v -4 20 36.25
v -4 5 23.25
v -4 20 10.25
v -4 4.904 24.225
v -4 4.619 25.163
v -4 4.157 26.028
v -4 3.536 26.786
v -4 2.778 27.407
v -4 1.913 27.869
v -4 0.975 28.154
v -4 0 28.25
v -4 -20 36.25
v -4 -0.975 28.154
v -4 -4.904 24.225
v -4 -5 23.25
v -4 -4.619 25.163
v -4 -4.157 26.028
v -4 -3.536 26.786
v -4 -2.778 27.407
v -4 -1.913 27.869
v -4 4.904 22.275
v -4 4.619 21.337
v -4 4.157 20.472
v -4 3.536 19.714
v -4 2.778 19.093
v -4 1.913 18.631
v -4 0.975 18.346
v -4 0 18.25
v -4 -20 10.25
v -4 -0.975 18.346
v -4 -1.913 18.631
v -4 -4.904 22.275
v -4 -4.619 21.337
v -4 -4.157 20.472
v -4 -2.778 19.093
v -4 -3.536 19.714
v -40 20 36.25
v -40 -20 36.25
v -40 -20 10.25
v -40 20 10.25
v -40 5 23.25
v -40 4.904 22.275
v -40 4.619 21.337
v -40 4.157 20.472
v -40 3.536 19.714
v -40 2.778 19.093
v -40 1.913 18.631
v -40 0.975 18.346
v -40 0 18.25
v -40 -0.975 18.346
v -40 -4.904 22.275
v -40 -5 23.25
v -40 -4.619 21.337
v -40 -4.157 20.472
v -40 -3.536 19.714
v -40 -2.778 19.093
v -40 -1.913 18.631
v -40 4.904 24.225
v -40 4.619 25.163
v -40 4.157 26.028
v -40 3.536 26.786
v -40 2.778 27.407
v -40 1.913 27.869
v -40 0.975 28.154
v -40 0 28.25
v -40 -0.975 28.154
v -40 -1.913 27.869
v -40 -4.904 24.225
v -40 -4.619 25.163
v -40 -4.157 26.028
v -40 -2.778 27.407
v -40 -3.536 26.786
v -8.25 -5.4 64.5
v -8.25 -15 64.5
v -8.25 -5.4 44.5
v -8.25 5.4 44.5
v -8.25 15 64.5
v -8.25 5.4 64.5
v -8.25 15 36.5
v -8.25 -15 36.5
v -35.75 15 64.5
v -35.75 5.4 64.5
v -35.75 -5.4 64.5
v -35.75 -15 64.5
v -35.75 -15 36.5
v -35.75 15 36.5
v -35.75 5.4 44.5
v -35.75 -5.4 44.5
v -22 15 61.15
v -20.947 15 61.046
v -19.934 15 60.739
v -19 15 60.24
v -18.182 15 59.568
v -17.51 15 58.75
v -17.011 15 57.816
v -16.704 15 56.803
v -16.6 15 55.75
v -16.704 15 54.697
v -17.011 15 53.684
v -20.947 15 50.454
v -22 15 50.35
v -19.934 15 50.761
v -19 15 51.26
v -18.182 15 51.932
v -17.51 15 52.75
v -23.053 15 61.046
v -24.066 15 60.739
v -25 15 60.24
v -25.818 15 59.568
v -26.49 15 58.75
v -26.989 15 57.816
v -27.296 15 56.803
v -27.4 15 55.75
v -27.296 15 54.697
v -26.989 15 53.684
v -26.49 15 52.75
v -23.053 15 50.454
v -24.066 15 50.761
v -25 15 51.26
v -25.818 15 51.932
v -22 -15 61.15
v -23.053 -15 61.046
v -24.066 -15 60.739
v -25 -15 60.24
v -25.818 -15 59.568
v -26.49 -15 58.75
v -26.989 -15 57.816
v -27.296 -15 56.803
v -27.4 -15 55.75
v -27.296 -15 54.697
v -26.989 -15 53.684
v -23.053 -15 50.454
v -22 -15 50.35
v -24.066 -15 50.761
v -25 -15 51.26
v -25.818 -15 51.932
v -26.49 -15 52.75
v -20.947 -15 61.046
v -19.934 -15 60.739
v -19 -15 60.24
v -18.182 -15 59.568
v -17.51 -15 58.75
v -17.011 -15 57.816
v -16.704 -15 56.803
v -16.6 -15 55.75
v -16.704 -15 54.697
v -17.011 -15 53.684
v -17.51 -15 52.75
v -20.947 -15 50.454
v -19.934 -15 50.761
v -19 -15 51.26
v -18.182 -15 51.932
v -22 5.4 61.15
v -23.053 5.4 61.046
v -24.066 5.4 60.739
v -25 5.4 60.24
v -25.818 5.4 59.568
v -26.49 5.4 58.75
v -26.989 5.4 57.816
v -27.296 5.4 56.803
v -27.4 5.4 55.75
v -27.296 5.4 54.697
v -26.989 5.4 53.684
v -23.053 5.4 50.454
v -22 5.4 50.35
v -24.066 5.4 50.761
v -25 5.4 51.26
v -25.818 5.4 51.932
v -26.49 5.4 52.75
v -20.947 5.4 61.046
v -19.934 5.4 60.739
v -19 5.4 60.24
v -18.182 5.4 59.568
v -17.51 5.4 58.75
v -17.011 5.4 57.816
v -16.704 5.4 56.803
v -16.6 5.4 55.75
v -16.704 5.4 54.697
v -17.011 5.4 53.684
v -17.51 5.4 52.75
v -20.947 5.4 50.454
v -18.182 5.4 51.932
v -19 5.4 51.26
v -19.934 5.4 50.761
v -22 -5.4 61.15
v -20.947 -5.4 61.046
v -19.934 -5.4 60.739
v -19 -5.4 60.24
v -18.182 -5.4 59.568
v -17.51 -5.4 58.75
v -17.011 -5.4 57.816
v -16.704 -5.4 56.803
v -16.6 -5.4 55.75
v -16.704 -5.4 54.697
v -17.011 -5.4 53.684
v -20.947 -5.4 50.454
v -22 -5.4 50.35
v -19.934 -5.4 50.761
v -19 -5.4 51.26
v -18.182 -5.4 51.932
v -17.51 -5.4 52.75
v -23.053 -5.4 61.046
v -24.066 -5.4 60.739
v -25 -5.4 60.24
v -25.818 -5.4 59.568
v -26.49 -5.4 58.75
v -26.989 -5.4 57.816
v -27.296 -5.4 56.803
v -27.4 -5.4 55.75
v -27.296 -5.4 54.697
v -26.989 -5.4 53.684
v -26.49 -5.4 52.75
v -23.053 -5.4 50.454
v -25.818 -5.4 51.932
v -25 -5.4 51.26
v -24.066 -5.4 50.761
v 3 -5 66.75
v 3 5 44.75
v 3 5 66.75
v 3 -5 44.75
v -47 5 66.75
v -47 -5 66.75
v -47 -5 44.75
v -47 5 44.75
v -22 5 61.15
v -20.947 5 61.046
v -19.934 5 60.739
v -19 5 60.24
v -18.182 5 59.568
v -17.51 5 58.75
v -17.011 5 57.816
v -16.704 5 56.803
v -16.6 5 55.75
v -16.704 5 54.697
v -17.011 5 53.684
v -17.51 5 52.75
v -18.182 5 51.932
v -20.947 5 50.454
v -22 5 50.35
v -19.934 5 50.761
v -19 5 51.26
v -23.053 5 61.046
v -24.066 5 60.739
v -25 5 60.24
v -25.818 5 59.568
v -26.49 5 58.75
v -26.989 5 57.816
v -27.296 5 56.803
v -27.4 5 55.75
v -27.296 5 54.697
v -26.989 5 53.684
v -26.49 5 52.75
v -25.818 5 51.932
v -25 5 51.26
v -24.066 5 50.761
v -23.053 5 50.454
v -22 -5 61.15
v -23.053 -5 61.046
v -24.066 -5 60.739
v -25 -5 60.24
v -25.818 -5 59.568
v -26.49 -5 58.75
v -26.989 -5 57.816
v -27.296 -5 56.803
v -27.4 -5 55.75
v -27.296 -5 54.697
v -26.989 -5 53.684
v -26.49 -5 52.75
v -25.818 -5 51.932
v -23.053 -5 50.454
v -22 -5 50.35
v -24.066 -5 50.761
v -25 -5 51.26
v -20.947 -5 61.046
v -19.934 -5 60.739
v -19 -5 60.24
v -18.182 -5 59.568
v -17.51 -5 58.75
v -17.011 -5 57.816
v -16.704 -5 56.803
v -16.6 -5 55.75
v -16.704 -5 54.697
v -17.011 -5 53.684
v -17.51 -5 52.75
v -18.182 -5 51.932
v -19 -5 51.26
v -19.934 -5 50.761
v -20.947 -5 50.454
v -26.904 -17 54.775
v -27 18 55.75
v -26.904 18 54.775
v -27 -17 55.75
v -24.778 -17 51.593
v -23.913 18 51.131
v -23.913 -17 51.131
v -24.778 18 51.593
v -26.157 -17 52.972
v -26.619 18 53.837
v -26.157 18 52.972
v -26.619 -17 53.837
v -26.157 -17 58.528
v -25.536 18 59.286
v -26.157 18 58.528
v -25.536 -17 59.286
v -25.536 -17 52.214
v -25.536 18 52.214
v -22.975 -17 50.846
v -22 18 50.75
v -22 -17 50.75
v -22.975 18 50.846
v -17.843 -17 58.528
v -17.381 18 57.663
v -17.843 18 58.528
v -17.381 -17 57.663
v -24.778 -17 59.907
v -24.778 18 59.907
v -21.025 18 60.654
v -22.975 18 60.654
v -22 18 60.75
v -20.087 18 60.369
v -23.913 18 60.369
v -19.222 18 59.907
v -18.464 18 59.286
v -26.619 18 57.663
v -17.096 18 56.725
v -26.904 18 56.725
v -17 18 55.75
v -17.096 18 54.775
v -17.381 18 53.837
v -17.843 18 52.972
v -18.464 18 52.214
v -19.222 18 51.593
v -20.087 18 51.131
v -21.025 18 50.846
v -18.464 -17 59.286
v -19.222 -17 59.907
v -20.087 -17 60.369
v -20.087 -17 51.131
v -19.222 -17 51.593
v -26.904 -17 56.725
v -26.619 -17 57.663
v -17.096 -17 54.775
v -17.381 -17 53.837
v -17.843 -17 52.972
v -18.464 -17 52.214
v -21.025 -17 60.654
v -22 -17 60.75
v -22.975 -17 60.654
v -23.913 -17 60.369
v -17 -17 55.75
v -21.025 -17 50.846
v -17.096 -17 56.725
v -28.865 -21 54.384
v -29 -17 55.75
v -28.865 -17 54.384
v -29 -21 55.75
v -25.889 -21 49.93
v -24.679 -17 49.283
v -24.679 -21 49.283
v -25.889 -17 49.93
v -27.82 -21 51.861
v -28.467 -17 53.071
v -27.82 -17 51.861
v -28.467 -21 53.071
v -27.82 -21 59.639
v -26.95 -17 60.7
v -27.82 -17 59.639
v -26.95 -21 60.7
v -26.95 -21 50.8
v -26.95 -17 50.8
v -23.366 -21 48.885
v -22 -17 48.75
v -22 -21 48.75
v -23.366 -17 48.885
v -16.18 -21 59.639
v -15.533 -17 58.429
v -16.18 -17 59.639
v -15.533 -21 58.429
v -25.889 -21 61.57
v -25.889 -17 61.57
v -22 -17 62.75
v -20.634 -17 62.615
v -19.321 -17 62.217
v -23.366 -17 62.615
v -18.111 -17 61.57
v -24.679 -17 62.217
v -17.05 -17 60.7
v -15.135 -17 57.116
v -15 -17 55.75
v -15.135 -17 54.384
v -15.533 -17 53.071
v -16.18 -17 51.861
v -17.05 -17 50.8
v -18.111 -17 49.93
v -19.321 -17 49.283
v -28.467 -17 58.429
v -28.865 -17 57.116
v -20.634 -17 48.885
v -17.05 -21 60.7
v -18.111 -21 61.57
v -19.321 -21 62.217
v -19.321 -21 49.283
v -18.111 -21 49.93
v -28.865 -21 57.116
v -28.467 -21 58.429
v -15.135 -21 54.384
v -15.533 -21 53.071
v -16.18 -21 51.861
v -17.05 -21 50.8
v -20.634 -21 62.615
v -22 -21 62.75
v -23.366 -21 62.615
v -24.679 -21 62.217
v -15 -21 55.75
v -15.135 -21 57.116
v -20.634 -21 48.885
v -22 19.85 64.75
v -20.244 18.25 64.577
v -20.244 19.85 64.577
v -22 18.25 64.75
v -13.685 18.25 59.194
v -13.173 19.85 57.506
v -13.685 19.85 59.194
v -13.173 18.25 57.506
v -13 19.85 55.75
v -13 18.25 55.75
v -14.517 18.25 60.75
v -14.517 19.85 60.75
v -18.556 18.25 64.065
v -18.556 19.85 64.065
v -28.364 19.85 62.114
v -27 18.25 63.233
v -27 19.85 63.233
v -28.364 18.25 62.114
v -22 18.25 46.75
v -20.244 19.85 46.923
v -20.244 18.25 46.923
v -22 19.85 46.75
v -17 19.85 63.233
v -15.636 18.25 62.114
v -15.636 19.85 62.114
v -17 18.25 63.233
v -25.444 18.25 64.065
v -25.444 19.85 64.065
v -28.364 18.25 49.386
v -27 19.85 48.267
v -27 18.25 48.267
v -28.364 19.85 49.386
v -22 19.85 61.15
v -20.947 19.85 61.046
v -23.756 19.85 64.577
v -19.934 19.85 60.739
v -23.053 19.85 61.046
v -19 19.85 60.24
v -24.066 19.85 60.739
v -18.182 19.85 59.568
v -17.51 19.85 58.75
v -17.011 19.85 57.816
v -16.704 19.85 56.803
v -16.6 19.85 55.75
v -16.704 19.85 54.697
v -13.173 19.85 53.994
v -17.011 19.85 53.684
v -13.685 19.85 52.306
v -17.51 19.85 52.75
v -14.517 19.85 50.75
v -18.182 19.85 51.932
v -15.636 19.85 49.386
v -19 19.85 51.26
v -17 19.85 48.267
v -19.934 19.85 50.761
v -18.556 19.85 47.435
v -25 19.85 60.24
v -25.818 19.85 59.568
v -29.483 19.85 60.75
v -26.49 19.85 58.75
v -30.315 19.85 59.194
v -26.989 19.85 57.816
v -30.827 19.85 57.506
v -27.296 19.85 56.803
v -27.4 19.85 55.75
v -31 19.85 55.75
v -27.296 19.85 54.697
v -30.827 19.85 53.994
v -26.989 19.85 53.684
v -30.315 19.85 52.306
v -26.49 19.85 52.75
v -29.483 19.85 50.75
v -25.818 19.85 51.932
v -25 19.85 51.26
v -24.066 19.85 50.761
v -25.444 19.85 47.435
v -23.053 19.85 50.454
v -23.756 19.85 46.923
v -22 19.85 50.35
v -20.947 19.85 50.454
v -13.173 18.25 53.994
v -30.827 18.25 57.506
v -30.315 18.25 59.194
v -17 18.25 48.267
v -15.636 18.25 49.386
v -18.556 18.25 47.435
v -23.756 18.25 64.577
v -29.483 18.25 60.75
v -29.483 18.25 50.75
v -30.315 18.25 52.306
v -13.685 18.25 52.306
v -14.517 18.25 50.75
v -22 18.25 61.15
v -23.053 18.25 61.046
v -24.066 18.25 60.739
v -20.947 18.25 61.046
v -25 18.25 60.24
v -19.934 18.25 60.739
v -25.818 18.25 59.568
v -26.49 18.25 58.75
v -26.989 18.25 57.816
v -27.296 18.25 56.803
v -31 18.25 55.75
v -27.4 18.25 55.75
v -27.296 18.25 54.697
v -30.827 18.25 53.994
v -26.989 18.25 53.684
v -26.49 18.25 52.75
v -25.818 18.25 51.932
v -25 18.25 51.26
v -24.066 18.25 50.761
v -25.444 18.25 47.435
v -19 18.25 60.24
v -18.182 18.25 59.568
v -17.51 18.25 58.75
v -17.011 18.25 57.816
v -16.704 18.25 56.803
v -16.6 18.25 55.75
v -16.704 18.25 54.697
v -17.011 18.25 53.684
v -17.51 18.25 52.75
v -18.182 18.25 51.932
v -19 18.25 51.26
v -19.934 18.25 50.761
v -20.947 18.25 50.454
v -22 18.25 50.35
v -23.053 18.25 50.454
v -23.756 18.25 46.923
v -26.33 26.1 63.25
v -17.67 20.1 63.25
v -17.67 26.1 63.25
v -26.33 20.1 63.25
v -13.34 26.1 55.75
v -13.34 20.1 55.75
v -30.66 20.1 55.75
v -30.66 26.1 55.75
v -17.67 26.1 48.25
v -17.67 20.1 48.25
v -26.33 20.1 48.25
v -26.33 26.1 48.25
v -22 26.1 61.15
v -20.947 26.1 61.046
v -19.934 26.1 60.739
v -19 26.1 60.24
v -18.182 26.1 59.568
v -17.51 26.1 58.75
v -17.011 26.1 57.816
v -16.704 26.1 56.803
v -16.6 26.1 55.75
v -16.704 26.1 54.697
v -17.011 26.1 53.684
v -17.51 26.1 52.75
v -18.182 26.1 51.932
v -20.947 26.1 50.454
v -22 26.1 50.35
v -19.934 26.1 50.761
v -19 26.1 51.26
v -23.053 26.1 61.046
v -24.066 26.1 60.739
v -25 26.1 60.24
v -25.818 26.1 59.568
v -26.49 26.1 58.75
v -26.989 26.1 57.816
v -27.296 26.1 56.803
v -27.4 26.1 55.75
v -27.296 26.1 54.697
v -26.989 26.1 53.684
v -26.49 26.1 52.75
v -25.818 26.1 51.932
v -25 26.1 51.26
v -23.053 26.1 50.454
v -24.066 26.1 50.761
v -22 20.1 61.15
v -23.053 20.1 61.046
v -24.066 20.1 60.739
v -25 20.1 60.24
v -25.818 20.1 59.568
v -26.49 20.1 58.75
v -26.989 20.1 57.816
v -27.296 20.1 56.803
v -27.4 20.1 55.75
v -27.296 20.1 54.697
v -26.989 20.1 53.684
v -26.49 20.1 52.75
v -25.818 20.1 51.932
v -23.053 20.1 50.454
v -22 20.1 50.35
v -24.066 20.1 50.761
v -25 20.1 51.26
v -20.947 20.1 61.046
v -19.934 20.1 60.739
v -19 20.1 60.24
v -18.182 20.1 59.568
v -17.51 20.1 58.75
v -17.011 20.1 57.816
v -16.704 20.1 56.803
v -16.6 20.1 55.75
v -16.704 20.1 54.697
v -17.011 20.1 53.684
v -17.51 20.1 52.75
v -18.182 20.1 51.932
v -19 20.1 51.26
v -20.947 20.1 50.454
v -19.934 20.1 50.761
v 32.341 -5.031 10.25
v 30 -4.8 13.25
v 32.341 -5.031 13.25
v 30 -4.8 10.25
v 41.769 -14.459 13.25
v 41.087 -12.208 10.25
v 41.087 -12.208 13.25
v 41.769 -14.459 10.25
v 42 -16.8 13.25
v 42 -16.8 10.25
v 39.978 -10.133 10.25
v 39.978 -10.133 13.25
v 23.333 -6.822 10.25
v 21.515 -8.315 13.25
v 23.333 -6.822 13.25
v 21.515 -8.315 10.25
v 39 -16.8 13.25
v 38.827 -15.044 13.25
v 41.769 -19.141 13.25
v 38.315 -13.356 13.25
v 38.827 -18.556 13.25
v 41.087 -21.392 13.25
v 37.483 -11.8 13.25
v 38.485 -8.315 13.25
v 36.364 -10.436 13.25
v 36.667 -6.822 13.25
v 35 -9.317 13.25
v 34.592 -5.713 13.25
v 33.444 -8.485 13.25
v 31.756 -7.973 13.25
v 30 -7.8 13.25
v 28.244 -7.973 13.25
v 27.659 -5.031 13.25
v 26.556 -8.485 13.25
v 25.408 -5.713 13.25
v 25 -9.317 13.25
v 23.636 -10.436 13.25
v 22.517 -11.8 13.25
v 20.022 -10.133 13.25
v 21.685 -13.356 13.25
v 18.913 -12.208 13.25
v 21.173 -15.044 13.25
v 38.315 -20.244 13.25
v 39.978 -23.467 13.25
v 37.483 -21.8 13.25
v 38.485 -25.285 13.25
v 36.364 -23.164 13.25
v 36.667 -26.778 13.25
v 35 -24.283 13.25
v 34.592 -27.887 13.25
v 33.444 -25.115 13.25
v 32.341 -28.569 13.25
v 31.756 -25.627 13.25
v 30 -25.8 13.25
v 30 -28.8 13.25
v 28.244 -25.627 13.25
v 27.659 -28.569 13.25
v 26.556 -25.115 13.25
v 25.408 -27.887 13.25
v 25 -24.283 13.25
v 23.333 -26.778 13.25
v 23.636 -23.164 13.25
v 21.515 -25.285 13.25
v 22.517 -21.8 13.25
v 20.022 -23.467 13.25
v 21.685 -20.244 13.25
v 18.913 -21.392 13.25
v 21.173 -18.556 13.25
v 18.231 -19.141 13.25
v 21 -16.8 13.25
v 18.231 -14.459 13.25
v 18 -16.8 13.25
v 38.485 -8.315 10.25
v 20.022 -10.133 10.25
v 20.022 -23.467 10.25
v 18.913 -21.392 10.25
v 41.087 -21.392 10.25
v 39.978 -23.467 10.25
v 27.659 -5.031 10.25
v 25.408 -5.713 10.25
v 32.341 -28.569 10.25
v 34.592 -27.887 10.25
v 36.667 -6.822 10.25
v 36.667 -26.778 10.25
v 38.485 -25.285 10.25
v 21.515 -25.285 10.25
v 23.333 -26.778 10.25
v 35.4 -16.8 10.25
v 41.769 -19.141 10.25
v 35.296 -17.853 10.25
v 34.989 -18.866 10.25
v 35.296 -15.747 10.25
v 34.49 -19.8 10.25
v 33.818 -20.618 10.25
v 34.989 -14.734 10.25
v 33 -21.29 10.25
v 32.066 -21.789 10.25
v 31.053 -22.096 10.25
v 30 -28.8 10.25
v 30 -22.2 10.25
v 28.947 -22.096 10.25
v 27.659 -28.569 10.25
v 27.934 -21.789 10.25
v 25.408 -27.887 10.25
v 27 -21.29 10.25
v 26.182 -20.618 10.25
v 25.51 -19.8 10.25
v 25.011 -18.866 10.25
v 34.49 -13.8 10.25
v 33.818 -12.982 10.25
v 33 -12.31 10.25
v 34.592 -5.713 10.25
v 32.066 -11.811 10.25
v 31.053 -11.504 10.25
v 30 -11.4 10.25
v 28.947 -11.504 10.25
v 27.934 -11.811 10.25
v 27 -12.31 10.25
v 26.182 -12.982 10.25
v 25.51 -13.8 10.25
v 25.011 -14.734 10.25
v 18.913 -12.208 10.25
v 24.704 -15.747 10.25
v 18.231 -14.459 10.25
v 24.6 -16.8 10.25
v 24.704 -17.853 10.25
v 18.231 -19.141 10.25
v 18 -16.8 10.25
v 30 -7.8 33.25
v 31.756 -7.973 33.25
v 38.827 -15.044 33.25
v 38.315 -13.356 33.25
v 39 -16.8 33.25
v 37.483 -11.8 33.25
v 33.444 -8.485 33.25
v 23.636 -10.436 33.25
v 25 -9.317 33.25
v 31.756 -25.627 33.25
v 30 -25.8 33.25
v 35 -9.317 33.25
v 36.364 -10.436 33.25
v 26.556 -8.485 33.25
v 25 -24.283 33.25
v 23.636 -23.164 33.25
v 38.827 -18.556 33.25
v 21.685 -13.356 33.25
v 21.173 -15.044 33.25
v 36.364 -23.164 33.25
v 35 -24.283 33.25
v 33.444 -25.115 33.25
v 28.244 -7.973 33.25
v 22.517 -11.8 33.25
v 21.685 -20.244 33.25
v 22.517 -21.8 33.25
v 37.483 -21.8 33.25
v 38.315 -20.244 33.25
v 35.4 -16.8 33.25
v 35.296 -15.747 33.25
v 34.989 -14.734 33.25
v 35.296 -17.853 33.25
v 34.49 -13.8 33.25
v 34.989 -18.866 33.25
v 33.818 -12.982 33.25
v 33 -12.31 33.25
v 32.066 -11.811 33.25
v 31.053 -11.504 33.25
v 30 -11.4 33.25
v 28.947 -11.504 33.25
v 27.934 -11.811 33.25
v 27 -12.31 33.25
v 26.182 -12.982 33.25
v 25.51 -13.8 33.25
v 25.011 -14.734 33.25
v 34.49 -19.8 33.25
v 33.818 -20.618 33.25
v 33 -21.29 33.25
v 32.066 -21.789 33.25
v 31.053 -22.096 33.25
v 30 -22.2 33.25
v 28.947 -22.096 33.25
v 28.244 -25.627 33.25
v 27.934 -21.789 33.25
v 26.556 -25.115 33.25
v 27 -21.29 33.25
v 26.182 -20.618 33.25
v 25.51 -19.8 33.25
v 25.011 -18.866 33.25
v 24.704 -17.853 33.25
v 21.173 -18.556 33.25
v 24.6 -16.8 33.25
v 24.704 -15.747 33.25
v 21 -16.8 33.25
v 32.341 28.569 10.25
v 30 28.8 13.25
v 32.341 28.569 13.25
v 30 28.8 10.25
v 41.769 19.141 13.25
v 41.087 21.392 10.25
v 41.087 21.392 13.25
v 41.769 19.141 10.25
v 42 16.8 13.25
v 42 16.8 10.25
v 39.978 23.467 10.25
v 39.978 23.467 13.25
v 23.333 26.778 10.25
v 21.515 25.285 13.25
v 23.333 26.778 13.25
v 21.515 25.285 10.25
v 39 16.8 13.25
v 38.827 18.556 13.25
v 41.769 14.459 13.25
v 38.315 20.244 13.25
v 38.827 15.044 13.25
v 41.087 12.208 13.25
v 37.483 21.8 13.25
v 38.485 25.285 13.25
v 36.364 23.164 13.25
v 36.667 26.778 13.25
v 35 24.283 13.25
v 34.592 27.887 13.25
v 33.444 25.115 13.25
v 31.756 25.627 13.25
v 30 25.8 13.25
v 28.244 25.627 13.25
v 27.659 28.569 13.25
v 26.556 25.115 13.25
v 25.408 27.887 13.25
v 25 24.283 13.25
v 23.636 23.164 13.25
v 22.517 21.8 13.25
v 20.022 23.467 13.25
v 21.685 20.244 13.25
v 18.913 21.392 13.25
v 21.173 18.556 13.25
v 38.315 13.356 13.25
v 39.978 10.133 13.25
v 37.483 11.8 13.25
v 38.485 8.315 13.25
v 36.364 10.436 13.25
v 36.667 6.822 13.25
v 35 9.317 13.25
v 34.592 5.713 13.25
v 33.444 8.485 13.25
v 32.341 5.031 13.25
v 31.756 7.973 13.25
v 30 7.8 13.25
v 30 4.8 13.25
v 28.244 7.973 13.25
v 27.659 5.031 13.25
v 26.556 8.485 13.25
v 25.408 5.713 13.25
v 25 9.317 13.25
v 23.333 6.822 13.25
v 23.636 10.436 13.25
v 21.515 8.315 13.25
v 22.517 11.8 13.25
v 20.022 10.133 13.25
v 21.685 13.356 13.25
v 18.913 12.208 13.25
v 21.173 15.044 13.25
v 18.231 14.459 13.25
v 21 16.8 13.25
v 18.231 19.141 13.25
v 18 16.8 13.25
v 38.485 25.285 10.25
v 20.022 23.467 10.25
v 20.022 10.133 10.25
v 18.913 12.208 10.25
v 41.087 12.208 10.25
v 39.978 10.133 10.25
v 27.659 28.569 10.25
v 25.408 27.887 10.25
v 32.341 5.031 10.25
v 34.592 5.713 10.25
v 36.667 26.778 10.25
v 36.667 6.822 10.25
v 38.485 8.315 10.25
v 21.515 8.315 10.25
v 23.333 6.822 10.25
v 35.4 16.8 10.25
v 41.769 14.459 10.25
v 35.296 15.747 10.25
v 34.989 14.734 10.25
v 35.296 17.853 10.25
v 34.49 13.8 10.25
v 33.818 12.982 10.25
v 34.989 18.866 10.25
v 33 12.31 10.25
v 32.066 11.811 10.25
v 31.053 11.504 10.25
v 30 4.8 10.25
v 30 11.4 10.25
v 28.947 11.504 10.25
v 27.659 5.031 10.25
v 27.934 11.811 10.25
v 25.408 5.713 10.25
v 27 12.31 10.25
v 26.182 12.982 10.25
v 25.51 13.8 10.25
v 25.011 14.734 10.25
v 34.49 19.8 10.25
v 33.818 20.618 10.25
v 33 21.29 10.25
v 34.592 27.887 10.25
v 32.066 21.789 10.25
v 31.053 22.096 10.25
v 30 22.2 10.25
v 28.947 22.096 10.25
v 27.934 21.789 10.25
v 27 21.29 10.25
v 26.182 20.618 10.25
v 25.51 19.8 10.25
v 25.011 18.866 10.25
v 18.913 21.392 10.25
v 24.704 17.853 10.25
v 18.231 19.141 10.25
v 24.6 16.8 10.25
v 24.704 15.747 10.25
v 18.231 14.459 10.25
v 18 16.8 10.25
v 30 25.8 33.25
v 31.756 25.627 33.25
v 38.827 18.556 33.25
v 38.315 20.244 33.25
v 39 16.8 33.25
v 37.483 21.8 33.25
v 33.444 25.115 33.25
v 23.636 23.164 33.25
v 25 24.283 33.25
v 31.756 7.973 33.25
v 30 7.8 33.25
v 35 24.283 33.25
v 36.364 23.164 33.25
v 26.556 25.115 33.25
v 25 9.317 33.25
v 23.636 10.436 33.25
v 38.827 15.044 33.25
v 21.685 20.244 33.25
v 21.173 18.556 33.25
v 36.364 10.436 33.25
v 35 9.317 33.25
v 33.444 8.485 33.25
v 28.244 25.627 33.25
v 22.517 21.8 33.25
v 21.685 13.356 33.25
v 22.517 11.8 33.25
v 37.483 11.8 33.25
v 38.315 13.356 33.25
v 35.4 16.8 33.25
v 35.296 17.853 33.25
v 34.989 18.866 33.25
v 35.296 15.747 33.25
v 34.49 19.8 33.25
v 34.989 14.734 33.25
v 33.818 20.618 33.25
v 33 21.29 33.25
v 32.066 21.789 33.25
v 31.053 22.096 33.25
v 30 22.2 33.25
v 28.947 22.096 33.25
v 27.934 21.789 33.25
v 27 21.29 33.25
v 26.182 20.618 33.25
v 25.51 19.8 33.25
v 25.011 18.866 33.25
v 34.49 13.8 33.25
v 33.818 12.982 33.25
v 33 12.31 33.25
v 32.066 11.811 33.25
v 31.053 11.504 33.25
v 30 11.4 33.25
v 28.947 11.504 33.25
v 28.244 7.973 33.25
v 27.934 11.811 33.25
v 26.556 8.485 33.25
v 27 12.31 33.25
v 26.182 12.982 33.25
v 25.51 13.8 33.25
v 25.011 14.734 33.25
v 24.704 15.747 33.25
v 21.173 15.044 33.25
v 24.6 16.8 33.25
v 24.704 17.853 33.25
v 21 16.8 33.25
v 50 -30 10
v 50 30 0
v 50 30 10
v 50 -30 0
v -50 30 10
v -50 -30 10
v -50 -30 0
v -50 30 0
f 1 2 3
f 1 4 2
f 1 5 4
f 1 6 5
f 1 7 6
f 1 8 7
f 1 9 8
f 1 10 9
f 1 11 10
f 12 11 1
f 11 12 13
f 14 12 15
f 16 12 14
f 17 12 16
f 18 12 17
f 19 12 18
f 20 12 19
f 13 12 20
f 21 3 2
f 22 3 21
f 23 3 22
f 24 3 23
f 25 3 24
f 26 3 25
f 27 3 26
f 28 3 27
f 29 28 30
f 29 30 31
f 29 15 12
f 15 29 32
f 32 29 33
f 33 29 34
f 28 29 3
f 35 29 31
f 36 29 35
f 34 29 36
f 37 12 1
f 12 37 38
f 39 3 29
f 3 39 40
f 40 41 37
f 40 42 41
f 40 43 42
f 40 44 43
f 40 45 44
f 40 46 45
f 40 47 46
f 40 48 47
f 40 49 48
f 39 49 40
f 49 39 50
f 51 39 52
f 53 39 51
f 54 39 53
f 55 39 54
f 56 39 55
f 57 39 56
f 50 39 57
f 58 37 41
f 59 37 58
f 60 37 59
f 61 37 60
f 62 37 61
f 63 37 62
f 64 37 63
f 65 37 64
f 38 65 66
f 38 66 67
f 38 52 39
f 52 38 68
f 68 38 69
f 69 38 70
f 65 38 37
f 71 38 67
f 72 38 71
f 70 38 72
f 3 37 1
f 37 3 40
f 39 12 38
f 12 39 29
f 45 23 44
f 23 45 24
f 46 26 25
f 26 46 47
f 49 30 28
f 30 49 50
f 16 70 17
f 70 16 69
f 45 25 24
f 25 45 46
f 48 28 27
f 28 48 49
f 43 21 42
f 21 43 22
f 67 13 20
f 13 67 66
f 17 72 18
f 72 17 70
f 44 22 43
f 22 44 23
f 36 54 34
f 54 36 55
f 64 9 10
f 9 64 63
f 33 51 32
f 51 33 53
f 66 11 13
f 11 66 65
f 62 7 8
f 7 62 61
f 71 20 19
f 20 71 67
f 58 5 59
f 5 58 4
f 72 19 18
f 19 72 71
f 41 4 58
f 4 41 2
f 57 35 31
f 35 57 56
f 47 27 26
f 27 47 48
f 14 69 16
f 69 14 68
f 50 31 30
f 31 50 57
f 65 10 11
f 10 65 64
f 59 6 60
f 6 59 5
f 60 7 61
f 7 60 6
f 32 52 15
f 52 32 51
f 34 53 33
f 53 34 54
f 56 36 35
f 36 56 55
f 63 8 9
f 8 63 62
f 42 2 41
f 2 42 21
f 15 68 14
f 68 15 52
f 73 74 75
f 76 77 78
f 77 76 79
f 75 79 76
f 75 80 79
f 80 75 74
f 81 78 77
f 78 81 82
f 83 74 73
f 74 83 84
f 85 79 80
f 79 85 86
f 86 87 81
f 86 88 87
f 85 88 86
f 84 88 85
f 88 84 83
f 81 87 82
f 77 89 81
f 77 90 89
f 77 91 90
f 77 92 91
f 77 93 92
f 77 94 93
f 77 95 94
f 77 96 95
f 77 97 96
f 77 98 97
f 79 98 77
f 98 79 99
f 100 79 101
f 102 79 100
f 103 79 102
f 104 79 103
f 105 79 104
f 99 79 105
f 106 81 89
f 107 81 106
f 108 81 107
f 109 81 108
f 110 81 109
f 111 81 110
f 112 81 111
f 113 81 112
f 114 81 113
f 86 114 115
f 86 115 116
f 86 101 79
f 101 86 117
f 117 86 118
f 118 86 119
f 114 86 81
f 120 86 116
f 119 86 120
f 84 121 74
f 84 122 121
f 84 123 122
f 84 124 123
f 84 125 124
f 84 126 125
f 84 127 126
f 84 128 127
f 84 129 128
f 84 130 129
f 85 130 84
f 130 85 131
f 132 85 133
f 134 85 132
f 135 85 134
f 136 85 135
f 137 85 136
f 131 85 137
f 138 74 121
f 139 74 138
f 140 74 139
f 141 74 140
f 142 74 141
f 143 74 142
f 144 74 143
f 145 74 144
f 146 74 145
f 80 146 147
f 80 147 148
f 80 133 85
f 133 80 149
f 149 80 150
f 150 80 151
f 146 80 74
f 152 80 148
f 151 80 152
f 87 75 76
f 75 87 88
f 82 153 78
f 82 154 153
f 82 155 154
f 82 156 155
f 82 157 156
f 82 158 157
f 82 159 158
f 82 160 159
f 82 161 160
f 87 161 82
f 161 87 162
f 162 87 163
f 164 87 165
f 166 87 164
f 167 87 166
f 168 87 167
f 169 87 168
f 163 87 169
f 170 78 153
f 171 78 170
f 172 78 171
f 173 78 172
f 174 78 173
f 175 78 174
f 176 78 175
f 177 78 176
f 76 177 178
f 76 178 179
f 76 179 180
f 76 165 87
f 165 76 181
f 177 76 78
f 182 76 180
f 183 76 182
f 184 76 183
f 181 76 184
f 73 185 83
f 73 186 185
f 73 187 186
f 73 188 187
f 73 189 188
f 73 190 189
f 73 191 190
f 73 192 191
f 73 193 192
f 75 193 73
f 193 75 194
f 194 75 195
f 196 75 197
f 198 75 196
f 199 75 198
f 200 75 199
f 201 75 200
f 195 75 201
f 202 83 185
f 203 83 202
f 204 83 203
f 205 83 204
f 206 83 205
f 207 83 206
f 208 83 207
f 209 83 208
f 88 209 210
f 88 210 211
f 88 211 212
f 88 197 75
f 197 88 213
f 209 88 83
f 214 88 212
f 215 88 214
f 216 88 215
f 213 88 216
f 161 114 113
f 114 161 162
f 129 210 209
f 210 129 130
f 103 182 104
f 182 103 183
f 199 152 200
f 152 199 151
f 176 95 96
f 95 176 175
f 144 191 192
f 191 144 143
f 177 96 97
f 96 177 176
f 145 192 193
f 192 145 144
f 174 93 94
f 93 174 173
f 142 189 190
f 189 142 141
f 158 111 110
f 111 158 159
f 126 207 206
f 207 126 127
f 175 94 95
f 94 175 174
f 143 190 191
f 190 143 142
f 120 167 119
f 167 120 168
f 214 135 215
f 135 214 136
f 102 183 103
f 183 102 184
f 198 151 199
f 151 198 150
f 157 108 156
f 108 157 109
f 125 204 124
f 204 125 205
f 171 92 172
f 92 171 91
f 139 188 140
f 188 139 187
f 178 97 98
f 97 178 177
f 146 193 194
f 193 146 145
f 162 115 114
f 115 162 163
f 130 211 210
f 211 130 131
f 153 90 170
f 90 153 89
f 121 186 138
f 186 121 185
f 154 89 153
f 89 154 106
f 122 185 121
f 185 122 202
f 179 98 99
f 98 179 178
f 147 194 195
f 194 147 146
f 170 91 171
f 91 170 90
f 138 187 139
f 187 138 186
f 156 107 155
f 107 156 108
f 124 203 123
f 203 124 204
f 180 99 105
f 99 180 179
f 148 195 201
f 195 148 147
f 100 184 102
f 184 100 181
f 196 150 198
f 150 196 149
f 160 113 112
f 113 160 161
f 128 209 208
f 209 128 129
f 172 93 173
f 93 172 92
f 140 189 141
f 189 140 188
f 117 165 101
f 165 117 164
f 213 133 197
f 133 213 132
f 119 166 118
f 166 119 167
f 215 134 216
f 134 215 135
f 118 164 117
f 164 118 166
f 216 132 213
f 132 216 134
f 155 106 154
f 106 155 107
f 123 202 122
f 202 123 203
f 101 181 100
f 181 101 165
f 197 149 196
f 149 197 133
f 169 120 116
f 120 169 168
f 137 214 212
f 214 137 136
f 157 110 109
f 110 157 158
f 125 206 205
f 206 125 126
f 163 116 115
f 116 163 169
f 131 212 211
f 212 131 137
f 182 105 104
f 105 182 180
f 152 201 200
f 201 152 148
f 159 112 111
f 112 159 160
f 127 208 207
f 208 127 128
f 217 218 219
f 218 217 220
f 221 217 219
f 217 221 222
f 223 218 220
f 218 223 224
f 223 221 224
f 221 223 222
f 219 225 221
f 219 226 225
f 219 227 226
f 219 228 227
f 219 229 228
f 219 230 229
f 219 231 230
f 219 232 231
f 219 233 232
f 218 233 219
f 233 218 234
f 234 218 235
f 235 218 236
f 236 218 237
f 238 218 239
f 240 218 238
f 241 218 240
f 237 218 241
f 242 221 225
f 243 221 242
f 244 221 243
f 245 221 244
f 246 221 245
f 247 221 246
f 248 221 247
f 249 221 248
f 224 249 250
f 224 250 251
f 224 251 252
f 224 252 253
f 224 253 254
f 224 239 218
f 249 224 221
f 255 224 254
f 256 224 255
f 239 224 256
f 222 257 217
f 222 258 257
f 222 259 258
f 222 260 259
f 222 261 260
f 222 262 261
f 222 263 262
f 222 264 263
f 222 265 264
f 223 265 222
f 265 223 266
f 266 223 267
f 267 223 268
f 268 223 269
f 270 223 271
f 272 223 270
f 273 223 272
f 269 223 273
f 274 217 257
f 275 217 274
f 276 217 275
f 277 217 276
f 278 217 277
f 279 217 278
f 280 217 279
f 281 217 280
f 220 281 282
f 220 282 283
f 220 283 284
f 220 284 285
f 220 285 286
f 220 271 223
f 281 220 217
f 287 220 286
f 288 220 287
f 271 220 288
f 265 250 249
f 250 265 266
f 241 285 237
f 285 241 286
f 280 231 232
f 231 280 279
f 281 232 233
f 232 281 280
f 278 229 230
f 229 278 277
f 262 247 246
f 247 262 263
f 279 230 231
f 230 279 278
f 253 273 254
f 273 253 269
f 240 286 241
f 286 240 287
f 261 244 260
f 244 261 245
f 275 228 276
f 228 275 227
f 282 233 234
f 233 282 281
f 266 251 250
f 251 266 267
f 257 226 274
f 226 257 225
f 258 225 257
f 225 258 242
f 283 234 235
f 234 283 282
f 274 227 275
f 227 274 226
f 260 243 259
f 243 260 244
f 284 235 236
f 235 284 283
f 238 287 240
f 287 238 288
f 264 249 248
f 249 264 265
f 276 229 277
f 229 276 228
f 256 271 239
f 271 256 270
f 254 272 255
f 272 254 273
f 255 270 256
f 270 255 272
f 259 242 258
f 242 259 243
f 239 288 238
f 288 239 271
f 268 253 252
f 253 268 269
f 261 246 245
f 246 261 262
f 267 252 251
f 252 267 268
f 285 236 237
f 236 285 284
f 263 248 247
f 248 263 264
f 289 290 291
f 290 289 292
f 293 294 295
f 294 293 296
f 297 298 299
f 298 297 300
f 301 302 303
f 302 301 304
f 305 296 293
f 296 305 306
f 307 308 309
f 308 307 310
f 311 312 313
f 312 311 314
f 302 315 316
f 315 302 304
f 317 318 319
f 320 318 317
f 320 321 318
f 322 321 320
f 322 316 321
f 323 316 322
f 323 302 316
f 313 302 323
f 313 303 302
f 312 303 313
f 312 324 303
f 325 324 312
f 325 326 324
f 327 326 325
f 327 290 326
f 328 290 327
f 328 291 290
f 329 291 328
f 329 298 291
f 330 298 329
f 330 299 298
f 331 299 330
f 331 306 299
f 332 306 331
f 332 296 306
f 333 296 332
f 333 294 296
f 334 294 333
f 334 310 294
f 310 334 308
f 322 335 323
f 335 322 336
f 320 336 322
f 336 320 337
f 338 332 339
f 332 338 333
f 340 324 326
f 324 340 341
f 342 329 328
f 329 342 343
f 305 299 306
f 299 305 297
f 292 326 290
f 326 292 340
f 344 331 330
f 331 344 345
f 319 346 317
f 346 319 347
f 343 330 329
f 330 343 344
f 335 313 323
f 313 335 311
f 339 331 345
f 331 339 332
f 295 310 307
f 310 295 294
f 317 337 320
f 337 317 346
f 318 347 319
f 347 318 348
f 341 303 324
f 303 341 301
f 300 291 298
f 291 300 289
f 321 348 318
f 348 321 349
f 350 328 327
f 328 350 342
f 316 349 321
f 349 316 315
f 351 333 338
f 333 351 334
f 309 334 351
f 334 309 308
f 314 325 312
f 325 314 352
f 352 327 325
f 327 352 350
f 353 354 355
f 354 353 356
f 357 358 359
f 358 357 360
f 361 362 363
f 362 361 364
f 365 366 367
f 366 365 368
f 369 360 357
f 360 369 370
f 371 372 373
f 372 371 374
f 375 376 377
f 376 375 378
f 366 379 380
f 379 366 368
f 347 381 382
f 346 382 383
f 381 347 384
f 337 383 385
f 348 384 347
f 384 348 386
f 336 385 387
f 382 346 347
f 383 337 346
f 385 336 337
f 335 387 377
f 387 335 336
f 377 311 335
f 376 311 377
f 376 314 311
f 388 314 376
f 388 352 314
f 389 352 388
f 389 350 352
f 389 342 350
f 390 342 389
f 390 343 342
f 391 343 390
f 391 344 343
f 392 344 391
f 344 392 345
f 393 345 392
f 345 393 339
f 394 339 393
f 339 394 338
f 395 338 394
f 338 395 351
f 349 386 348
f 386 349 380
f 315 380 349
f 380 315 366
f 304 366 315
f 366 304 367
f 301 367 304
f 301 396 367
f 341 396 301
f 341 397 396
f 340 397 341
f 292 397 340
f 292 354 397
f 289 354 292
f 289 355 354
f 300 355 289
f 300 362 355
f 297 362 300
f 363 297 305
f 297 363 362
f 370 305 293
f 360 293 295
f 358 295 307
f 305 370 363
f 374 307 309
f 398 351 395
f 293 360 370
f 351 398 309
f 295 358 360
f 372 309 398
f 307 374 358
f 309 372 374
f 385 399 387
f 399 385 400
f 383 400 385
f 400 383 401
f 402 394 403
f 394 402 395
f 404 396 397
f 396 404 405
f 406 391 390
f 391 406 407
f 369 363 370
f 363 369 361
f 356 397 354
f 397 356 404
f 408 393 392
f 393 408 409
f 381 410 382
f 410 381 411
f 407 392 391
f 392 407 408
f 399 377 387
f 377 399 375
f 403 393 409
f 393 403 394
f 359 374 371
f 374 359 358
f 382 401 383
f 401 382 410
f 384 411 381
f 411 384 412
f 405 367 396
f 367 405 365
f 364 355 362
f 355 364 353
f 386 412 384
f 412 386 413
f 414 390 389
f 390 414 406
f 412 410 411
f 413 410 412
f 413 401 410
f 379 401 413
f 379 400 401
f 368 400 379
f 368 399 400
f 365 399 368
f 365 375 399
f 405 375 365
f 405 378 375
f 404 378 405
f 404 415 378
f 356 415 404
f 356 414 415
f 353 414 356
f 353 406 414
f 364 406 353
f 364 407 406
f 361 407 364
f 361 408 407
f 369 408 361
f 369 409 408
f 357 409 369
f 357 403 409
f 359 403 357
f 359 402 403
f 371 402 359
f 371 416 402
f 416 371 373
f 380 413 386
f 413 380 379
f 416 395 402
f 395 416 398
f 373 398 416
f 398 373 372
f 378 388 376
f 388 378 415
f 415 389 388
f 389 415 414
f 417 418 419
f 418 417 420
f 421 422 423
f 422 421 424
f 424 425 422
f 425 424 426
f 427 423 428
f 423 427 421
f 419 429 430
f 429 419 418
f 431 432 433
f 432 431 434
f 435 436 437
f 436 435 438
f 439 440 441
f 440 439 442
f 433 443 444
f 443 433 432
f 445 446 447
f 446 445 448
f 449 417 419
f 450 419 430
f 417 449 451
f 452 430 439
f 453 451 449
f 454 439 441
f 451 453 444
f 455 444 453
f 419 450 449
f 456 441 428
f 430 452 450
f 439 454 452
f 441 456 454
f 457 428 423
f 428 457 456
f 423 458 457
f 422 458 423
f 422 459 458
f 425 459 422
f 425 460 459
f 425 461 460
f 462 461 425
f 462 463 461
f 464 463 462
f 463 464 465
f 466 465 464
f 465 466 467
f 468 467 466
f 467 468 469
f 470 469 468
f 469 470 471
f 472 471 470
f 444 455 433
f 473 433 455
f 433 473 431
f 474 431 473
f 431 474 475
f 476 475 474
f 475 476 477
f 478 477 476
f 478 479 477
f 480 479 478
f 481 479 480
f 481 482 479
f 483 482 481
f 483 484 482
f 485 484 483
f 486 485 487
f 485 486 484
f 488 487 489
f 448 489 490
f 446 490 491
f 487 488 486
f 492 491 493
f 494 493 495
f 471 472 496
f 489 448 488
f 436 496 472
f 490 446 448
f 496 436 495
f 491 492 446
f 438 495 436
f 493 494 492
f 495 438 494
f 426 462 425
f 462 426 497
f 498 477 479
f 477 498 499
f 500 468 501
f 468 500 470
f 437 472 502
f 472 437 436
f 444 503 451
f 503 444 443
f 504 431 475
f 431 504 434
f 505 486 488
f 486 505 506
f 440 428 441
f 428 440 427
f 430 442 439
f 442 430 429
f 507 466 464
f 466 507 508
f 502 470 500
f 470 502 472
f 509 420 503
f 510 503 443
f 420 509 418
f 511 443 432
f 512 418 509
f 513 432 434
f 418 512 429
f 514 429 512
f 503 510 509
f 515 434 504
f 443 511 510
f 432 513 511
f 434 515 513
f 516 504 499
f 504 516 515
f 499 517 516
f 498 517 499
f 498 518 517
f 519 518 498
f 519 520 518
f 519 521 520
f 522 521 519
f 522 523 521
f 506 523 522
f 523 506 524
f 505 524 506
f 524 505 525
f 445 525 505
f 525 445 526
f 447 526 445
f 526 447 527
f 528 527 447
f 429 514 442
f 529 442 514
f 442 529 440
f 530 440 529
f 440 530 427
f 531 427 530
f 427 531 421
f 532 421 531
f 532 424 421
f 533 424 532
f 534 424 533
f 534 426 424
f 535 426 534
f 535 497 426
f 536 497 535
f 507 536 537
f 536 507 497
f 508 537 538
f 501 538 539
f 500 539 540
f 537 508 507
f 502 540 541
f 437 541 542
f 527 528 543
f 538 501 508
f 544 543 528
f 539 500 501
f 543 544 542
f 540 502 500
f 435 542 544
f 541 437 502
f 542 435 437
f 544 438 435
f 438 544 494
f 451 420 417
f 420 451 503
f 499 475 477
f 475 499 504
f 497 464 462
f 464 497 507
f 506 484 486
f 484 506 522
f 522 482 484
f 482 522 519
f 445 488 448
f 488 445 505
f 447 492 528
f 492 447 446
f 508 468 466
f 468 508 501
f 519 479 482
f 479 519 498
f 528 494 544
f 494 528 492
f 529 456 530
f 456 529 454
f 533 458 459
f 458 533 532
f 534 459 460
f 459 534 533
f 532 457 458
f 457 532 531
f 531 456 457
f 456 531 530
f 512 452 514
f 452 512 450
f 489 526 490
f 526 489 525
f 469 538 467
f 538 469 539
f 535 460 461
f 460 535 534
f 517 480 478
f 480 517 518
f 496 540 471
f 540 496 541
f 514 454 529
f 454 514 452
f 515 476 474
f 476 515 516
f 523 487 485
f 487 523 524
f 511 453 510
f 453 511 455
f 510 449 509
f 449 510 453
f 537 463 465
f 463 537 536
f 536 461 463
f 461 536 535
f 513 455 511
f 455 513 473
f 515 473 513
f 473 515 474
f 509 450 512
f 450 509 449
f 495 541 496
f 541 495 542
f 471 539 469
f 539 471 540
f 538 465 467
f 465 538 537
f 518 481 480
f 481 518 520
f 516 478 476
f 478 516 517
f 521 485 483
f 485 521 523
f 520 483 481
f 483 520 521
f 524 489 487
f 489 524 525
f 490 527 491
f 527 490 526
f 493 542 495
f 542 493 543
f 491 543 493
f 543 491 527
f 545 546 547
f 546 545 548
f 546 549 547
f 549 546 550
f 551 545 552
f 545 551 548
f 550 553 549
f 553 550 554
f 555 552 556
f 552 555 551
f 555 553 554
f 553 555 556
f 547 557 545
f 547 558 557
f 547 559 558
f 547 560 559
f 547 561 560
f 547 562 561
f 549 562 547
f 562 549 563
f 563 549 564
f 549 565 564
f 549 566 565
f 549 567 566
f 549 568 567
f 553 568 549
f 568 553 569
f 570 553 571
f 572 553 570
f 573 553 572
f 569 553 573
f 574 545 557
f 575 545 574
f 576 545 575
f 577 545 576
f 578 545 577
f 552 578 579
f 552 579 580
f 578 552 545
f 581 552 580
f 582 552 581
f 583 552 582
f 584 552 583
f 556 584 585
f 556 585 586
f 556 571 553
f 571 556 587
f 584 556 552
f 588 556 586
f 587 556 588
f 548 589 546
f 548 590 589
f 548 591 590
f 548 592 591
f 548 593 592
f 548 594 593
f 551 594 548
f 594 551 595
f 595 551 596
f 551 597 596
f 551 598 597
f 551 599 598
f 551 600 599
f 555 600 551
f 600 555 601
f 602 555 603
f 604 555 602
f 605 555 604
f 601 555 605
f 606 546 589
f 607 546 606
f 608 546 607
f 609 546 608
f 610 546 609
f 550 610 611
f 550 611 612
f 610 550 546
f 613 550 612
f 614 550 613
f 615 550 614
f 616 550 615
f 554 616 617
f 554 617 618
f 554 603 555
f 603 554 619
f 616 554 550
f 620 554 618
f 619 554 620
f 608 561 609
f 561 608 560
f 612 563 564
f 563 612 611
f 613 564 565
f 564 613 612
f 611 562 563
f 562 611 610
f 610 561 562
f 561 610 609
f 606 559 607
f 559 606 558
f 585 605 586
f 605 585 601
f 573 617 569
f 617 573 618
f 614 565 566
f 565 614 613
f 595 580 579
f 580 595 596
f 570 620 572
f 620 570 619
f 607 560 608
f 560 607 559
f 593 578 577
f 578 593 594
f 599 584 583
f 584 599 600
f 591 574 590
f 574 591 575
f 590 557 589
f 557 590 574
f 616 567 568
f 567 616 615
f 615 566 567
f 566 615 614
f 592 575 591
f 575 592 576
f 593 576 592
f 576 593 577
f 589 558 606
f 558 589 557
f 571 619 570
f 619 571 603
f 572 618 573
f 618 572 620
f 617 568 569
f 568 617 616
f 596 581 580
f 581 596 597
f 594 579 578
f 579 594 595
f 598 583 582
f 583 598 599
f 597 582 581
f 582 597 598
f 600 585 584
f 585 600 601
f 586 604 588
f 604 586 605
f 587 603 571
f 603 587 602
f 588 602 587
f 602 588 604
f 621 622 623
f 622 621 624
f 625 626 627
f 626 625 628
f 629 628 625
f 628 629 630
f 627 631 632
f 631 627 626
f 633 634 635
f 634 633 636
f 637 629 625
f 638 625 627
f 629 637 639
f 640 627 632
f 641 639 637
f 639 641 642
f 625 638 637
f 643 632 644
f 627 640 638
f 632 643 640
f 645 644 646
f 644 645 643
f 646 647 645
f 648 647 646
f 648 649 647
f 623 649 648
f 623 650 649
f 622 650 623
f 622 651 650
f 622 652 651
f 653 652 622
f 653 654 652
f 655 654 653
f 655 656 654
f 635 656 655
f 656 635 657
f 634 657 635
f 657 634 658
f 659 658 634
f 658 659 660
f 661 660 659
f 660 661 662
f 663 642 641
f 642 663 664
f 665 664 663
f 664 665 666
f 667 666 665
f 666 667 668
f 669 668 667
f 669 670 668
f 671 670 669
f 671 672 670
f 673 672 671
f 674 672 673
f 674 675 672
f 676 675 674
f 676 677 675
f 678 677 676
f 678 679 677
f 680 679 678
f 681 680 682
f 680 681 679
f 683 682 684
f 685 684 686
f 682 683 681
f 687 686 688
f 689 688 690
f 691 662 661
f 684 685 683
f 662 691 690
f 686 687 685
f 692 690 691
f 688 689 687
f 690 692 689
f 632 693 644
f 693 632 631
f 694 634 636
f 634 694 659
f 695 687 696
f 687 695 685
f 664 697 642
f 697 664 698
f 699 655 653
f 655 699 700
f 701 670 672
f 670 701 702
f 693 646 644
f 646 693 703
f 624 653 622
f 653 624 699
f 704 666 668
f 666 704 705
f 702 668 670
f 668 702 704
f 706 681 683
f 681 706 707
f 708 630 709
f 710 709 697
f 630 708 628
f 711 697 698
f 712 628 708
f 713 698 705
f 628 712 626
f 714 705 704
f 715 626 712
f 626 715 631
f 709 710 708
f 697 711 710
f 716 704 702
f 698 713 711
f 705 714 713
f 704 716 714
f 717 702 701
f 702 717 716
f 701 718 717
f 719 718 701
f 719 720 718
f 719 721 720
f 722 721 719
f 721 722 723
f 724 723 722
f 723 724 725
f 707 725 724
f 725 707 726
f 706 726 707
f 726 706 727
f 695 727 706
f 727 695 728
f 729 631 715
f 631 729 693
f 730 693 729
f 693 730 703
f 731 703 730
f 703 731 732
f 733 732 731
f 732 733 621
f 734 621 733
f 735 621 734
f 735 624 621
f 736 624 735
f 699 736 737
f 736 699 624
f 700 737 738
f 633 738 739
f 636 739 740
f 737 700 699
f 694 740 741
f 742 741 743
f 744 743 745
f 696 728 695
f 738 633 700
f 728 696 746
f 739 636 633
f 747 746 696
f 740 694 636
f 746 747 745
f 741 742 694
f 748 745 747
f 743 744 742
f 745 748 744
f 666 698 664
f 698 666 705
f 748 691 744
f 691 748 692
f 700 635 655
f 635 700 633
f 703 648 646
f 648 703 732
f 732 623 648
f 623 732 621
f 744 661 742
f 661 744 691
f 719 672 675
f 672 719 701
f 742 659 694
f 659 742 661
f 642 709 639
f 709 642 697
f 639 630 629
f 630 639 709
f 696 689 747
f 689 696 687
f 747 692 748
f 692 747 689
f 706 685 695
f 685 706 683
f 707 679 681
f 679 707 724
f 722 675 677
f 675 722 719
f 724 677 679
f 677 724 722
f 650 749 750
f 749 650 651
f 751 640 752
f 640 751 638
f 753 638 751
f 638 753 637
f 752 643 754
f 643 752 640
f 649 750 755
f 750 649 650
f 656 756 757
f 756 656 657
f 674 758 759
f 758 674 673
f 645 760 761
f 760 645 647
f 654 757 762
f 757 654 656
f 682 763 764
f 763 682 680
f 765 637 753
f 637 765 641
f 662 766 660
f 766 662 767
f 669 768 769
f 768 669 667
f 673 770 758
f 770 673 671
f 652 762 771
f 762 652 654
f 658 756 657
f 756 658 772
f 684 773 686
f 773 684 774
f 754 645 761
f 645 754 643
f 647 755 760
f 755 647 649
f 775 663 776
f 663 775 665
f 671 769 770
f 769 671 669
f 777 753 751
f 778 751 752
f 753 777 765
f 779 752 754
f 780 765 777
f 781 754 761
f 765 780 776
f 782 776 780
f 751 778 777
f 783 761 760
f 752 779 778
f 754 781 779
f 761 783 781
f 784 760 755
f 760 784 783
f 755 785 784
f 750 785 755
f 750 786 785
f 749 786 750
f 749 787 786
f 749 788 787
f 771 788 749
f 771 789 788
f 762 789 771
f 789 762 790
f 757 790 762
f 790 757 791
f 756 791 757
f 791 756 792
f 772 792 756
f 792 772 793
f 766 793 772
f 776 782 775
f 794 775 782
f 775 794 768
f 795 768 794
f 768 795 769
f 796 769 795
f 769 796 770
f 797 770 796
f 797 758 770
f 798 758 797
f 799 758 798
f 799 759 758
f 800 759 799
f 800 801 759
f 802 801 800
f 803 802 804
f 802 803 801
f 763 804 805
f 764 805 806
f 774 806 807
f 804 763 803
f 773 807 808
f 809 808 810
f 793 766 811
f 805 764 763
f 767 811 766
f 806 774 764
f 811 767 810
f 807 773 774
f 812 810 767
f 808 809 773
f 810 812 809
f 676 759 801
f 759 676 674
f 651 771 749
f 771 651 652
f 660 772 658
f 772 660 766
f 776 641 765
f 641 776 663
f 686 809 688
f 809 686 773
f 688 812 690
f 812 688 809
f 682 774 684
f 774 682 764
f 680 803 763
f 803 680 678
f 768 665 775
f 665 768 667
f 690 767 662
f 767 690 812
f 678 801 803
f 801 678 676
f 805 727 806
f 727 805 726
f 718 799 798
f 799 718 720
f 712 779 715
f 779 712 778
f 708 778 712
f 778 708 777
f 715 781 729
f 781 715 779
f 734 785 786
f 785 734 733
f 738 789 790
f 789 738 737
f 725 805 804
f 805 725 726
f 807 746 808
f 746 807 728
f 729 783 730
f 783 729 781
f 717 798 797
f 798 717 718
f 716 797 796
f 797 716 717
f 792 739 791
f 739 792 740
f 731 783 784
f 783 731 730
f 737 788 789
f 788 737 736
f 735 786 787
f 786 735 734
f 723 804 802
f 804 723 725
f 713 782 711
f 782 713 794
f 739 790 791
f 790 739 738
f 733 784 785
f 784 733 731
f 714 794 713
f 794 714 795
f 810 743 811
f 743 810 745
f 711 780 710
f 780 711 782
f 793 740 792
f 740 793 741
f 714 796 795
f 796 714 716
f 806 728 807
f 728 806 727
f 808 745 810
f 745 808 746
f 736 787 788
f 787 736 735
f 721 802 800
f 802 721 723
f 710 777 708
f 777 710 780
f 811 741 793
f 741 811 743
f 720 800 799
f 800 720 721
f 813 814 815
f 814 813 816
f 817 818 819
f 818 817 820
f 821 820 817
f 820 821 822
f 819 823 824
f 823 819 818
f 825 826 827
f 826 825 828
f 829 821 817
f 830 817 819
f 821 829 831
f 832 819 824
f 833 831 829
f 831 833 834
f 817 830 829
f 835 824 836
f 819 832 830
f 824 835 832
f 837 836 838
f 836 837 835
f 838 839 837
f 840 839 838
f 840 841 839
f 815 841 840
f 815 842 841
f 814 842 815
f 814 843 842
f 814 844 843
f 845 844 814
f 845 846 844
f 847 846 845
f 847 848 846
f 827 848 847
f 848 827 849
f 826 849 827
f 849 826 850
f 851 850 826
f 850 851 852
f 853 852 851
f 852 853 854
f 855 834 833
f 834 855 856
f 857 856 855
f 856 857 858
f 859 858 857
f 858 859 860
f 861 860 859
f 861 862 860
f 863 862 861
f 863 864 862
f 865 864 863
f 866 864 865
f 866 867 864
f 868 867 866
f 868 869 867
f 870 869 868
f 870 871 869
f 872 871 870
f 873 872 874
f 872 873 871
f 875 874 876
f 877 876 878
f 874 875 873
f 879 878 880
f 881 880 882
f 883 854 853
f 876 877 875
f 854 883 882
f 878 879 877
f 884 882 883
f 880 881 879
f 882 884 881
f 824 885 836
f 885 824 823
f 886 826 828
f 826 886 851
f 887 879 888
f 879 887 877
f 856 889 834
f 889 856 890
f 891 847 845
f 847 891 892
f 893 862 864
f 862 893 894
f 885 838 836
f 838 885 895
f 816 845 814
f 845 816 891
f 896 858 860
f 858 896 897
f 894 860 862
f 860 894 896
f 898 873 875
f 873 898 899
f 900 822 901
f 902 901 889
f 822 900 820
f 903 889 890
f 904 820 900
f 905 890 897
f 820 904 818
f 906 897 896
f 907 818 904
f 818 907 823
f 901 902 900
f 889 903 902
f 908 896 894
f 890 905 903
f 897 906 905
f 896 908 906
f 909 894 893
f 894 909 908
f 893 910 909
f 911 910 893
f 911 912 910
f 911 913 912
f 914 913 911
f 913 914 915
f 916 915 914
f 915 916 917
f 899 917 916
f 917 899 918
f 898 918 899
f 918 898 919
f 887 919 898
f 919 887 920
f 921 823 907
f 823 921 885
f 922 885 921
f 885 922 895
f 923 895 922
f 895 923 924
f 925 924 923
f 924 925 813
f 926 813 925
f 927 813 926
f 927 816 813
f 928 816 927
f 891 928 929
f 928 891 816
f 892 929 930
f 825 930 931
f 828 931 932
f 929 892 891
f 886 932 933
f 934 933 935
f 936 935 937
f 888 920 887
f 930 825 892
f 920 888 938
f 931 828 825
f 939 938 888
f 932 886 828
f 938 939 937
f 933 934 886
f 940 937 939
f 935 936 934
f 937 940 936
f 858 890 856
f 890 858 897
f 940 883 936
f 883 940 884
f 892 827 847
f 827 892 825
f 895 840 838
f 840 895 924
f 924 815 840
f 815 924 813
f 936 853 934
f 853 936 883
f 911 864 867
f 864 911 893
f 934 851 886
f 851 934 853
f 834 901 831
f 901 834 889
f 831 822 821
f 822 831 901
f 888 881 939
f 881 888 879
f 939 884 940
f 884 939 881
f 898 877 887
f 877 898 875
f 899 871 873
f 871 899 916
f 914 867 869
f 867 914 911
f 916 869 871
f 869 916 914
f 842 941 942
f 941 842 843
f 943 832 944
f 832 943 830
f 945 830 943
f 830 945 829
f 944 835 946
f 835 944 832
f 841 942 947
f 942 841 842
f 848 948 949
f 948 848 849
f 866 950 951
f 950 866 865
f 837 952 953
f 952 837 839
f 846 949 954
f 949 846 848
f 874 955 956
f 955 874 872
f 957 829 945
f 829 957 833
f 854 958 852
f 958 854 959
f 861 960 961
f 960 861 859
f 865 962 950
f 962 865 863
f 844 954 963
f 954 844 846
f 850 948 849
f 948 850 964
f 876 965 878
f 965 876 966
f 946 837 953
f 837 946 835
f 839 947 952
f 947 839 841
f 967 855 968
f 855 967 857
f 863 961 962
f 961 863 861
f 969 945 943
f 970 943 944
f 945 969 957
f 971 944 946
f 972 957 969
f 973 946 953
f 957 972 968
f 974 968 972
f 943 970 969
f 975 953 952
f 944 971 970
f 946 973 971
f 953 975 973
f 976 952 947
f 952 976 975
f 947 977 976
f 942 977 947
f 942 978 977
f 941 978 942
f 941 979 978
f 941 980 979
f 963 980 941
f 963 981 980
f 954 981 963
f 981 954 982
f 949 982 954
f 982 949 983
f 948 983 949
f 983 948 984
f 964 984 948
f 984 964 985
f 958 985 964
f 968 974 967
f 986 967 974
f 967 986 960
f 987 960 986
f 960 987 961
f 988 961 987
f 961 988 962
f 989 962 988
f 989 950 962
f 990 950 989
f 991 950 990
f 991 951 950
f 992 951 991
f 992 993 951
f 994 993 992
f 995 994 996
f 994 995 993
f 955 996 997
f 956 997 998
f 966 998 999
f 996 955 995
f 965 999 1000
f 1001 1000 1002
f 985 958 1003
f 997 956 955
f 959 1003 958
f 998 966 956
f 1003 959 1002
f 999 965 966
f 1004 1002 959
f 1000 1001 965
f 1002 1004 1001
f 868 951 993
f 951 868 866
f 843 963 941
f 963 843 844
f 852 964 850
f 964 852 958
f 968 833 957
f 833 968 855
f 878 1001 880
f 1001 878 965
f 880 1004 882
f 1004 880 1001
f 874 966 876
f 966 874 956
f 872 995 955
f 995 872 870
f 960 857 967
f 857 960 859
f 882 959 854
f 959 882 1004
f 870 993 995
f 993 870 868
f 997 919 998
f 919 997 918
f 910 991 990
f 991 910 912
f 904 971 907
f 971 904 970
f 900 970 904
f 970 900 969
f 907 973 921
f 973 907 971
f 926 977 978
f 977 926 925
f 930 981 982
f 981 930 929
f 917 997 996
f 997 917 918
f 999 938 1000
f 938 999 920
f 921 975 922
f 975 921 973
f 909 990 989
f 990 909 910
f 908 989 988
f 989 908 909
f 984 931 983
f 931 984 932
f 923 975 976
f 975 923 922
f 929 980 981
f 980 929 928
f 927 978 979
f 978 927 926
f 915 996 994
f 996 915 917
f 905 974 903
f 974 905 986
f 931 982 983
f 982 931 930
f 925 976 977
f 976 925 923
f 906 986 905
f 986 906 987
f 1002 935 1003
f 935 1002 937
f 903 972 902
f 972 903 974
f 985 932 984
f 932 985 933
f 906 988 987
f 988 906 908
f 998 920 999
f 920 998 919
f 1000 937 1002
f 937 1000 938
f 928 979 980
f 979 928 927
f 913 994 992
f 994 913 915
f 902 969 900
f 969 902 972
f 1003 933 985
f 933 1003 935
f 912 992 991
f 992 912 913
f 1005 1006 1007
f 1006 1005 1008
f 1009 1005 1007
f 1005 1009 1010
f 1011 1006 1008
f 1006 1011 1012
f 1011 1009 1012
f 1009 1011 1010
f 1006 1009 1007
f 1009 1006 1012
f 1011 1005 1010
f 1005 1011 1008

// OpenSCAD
$fn = 32;

// ------------------------------------------------------------------------
// Indexing jig: plate 100 x 60 mm, pin d10
// Every part is its own module, assembly() places every instance.
// ------------------------------------------------------------------------

// --- part 1 ---
module jig_plate() {
  difference() {
    translate([-50, -30, 0]) cube([100, 60, 10]);
  }
}

// --- part 2 ---
module locator_block() {
  difference() {
    translate([-18, -20, 0]) cube([36, 40, 26]);
    translate([0, 0, 13]) rotate([0, 90, 0]) cylinder(h = 38, d = 10, center = true);
  }
}

// --- part 3 ---
module index_fork() {
  difference() {
    translate([-13.75, -15, 0]) cube([27.5, 30, 28]);
    translate([-14.75, -5.4, 8]) cube([29.5, 10.8, 21]);
    translate([0, 0, 19.25]) rotate([90, 0, 0]) cylinder(h = 32, d = 10.8, center = true);
  }
}

// --- part 4 ---
module index_arm() {
  difference() {
    translate([-25, -5, 0]) cube([50, 10, 22]);
    translate([0, 0, 11]) rotate([90, 0, 0]) cylinder(h = 12, d = 10.8, center = true);
  }
}

// --- part 5 ---
module index_pin() {
  rotate([0, 90, 0]) cylinder(h = 36, d = 10, center = true);
  translate([-21, 0, 0]) rotate([0, 90, 0]) cylinder(h = 4, d = 14);
}

// --- part 6 ---
module pin_washer() {
  difference() {
      translate([0, 0, 0]) cylinder(h = 1.6, d = 18);
      translate([0, 0, -1]) cylinder(h = 3.6, d = 10.8);
    }
}

// --- part 7 ---
module lock_nut() {
  difference() {
    linear_extrude(height = 6) polygon(points = [[8.66, 0], [4.33, 7.5], [-4.33, 7.5], [-8.66, 0], [-4.33, -7.5], [4.33, -7.5]]);
    translate([0, 0, -1]) cylinder(h = 8, d = 10.8);
  }
}

// --- part 8 ---
module guide_bush_a() {
  difference() {
    union() {
      cylinder(h = 3, d = 24);
      translate([0, 0, 3]) cylinder(h = 20, d = 18);
    }
    translate([0, 0, -1]) cylinder(h = 25, d = 10.8);
  }
}

// --- part 9 ---
module guide_bush_b() {
  difference() {
    union() {
      cylinder(h = 3, d = 24);
      translate([0, 0, 3]) cylinder(h = 20, d = 18);
    }
    translate([0, 0, -1]) cylinder(h = 25, d = 10.8);
  }
}

// --- assembly ---
module assembly() {
  color([0.80, 0.24, 0.20]) translate([0, 0, 0]) rotate([0, 0, 0]) jig_plate();
  color([0.20, 0.45, 0.75]) translate([-22, 0, 10.25]) rotate([0, 0, 0]) locator_block();
  color([0.25, 0.62, 0.32]) translate([-22, 0, 36.5]) rotate([0, 0, 0]) index_fork();
  color([0.92, 0.70, 0.18]) translate([-22, 0, 44.75]) rotate([0, 0, 0]) index_arm();
  color([0.58, 0.35, 0.70]) translate([-22, 0, 55.75]) rotate([0, 0, 90]) index_pin();
  color([0.16, 0.66, 0.66]) translate([-22, 19.85, 55.75]) rotate([90, 0, 0]) pin_washer();
  color([0.85, 0.48, 0.18]) translate([-22, 26.1, 55.75]) rotate([90, 0, 0]) lock_nut();
  color([0.55, 0.60, 0.65]) translate([30, -16.8, 10.25]) rotate([0, 0, 0]) guide_bush_a();
  color([0.75, 0.30, 0.55]) translate([30, 16.8, 10.25]) rotate([0, 0, 0]) guide_bush_b();
}

assembly();
